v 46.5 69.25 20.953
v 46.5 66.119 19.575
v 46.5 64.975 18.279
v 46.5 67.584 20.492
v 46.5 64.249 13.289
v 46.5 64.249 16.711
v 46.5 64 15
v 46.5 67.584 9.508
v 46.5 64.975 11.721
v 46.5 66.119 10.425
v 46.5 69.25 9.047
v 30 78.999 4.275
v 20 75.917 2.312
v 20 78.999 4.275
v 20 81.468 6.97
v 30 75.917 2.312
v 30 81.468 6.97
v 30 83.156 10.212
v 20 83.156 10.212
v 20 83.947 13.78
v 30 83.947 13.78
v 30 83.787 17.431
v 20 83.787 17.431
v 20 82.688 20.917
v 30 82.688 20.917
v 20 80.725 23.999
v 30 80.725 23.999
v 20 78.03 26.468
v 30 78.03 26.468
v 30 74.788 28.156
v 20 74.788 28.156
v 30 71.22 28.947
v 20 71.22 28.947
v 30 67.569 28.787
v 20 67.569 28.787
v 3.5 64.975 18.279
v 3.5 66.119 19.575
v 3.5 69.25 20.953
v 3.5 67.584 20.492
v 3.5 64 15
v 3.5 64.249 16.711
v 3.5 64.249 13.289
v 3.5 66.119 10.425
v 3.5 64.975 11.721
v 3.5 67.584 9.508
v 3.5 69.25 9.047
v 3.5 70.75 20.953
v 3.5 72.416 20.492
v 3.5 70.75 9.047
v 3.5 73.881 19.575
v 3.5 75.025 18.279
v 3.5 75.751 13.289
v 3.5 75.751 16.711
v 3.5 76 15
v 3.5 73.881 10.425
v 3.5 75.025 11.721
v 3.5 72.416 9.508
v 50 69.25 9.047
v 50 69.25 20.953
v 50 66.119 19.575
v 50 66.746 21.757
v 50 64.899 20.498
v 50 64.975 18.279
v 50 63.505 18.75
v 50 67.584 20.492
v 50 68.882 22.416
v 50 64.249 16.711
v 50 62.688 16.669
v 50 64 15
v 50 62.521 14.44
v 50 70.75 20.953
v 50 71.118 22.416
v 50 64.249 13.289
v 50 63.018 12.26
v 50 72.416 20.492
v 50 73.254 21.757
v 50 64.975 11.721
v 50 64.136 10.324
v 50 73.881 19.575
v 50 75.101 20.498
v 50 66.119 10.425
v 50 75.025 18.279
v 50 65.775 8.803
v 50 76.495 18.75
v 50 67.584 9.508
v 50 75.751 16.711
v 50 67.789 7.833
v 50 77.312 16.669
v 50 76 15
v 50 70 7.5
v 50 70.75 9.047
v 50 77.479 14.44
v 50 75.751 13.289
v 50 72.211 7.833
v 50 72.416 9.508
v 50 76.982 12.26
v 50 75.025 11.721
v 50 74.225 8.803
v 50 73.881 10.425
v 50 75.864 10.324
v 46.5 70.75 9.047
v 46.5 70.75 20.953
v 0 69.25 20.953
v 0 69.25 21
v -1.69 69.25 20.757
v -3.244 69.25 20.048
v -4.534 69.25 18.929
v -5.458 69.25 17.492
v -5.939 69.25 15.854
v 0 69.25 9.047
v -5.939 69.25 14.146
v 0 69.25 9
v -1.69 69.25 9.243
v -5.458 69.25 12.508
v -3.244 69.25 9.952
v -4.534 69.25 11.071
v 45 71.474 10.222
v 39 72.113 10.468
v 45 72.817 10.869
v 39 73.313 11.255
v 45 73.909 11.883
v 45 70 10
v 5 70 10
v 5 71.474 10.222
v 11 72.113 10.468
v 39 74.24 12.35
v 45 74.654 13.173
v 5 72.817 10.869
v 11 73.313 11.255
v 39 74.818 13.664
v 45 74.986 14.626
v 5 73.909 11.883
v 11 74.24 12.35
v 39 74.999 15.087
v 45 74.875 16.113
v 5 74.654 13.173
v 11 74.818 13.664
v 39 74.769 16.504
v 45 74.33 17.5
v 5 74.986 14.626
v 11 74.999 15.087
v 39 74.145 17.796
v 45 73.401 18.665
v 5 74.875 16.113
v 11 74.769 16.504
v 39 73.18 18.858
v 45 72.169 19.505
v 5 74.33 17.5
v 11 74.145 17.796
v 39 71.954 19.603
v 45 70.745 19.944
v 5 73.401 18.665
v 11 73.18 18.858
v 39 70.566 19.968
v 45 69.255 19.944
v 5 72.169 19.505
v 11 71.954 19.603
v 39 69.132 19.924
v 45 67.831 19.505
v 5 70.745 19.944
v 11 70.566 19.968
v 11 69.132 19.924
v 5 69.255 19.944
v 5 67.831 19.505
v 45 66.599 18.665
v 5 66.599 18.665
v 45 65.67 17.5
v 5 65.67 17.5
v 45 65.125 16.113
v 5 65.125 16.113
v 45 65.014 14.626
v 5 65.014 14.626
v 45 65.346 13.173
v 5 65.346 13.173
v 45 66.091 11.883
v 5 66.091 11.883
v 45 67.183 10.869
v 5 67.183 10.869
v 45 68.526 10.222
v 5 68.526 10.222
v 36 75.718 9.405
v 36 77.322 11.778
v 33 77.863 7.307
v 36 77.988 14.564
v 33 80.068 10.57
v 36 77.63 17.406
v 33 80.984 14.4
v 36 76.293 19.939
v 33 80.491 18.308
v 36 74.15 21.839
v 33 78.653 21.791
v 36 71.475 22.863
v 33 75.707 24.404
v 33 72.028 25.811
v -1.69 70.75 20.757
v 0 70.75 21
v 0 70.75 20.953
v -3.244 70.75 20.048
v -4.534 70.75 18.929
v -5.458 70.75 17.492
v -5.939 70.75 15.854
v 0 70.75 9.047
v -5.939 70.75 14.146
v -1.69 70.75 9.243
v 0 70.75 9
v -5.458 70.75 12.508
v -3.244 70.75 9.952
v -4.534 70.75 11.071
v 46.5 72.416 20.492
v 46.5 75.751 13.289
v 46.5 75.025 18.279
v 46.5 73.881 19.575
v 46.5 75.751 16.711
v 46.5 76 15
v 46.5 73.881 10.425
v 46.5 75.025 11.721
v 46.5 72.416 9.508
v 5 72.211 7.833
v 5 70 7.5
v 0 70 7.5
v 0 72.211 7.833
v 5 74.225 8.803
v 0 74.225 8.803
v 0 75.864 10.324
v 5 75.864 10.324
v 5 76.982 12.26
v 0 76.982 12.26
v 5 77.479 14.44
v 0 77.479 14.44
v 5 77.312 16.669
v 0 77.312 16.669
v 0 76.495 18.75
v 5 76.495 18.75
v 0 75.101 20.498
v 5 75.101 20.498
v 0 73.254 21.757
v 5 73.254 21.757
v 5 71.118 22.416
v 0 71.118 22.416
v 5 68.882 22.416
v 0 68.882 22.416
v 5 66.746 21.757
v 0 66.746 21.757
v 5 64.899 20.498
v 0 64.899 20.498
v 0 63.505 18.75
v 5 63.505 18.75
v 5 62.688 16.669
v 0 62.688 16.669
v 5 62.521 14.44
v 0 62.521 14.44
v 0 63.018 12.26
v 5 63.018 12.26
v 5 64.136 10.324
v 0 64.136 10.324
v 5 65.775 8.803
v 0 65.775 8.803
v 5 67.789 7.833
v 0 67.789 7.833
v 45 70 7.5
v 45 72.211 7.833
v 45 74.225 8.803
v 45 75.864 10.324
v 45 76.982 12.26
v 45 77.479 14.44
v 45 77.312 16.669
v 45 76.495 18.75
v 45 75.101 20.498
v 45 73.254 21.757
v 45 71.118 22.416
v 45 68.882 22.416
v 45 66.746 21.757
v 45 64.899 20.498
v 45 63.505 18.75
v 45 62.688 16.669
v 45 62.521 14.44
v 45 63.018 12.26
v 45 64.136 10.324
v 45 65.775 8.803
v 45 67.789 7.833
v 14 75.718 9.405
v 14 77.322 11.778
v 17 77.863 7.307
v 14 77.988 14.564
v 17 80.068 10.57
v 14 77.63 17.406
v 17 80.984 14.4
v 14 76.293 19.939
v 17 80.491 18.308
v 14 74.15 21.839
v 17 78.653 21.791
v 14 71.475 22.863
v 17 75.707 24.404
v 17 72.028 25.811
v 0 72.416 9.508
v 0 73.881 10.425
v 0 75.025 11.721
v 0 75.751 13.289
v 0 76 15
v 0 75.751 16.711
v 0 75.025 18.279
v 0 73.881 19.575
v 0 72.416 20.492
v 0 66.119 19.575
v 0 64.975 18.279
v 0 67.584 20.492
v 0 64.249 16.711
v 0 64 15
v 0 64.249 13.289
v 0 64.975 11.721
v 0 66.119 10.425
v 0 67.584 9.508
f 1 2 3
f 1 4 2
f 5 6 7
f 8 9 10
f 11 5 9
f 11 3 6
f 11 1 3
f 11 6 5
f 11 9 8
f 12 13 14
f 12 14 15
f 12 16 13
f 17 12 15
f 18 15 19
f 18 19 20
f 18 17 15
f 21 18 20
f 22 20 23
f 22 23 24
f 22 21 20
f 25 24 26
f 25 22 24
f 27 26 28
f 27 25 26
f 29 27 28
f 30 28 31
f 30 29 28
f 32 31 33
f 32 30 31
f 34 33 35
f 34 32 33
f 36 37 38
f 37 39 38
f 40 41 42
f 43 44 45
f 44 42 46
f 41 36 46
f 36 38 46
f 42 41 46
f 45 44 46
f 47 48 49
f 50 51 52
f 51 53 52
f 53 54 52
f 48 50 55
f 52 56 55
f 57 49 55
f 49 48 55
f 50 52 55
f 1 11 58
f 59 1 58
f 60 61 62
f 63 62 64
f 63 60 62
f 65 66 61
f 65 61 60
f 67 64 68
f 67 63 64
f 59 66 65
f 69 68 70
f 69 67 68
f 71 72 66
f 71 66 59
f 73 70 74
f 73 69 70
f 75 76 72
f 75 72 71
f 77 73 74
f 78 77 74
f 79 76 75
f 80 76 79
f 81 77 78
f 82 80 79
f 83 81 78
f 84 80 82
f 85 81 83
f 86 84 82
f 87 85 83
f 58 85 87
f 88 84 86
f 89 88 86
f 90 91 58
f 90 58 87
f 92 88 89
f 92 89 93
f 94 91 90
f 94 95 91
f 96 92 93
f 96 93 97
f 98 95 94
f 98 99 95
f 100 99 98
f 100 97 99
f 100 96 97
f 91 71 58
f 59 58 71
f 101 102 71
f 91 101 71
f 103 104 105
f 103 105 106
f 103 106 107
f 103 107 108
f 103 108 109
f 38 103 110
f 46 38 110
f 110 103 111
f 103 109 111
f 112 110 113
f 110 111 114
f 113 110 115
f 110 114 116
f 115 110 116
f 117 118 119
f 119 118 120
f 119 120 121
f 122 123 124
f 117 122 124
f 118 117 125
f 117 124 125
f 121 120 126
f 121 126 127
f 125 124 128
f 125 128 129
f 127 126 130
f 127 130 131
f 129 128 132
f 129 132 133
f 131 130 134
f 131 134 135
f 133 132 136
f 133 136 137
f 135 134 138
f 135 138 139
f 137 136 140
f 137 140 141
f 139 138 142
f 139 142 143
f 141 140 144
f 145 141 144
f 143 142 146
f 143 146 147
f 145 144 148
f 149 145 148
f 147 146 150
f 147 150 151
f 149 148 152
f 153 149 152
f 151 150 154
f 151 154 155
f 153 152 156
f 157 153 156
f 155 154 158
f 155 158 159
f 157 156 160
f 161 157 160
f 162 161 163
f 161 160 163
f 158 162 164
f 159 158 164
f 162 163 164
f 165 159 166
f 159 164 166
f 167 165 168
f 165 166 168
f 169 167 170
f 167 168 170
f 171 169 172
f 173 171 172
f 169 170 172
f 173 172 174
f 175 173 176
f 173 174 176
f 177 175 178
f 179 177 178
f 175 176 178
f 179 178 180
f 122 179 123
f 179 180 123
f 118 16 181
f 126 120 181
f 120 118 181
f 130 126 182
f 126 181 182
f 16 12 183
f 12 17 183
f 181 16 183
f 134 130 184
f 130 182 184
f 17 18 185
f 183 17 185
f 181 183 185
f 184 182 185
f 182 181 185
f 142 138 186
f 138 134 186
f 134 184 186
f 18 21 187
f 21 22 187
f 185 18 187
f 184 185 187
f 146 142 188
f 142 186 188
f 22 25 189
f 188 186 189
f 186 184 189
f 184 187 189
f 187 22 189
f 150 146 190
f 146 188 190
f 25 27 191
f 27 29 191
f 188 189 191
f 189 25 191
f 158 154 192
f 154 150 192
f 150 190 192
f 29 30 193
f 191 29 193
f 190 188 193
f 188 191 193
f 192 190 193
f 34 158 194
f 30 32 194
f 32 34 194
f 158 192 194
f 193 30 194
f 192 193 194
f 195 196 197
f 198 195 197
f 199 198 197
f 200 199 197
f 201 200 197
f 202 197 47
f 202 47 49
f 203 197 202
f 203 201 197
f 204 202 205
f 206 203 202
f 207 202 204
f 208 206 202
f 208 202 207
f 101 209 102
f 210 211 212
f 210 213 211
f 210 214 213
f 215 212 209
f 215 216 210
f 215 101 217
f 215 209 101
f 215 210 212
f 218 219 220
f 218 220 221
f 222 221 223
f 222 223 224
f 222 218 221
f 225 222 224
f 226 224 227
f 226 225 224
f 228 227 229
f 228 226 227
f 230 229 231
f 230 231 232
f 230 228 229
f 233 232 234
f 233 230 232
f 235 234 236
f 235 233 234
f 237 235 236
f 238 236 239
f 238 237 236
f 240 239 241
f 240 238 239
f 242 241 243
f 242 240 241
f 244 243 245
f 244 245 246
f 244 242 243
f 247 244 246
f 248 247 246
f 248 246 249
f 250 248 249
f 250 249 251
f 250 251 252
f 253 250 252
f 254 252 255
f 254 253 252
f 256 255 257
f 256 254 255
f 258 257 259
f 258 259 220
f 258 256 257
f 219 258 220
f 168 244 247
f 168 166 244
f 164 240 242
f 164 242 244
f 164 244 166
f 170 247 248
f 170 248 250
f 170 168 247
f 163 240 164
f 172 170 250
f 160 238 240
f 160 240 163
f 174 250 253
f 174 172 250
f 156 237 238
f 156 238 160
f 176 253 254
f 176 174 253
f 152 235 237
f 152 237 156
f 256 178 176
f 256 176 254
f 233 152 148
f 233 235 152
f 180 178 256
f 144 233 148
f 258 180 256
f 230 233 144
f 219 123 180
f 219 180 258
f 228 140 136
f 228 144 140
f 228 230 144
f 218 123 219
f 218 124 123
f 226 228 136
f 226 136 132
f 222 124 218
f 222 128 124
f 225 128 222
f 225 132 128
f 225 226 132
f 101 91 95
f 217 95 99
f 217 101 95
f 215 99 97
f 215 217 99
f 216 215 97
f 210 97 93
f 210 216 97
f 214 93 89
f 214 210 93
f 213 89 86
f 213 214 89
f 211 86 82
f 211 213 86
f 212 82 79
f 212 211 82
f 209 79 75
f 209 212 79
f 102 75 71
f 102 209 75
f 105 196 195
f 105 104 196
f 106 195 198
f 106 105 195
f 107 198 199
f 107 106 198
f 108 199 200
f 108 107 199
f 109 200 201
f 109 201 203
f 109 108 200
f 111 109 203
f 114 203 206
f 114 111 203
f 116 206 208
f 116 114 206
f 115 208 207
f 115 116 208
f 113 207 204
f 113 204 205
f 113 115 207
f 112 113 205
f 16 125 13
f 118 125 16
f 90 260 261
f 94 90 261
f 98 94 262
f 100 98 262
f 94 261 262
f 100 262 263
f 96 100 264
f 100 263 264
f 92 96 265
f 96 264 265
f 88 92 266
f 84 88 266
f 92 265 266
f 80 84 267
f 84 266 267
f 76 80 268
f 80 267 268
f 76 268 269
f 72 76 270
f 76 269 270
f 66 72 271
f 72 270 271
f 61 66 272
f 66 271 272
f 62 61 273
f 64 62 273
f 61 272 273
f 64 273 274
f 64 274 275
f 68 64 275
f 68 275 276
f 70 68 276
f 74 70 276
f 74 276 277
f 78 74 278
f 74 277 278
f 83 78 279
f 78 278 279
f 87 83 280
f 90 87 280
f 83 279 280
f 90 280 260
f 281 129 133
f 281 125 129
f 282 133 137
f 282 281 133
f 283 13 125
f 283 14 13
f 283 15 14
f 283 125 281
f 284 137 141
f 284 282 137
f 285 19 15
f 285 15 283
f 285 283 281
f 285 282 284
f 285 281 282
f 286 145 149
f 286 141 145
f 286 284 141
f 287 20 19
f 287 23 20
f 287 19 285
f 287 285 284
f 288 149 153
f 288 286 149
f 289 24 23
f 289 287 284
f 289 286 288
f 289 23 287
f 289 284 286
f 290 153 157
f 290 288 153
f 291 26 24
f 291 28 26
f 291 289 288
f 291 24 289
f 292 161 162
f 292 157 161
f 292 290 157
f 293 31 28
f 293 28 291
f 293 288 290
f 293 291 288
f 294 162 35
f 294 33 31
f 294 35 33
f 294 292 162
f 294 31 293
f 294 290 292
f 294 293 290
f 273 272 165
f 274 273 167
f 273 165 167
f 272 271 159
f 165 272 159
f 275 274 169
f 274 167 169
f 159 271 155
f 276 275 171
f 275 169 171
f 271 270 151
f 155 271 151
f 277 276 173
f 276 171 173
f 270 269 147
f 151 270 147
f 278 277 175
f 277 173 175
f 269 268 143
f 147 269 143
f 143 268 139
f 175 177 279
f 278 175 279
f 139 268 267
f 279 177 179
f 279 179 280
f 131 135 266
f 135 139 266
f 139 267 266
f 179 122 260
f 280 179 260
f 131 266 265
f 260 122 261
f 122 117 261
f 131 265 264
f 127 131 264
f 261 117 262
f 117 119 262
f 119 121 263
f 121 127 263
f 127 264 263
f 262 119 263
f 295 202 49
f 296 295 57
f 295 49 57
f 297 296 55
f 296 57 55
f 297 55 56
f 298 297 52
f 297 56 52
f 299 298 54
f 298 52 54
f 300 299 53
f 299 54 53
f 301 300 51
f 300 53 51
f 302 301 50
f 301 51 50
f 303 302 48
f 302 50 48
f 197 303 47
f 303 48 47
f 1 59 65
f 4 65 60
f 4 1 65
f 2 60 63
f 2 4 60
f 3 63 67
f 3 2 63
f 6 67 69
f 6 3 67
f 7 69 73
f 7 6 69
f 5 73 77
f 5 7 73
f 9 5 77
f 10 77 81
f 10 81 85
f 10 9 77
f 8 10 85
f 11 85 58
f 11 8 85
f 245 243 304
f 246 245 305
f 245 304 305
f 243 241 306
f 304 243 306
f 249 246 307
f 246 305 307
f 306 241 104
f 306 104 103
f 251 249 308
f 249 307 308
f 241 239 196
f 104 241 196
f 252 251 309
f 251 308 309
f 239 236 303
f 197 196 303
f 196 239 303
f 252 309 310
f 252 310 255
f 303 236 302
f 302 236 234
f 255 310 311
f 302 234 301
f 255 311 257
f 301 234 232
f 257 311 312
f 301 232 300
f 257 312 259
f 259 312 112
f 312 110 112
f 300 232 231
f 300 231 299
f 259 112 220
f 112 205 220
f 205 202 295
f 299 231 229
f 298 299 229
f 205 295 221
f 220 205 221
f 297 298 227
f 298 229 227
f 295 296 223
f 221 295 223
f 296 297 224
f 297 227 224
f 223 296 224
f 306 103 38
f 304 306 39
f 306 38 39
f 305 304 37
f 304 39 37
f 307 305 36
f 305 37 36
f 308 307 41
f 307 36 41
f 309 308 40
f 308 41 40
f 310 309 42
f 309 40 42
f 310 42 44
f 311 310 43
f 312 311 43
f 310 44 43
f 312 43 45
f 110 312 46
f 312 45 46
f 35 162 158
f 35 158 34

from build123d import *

# Parameters (mm, degrees)
CYLINDER1033_W               = 6
CYLINDER1033_H               = 1.5
CYLINDER1033_ANGLE           = 180
CYLINDER1029_R               = 7.5
CYLINDER1029_DEPTH           = 5
CYLINDER1029_PITCH_ANGLE     = 90
THICKNESS001_T               = -1.5
BOX025_W                     = 4
BOX025_H                     = 1.5
BOX025_DEPTH                 = 12
CYLINDER1027_R               = 5
CYLINDER1027_DEPTH           = 40
CYLINDER1027_PITCH_ANGLE     = 90
CYLINDER1026_W               = 14
CYLINDER1026_H               = 10
CYLINDER1026_ANGLE           = 165
CYLINDER1026_ROLL_ANGLE      = 90
CYLINDER1026_PITCH_ANGLE     = 65
CYLINDER1026_PLACEMENT_ANGLE = 90
CONE001_ANGLE                = 165
CONE001_ROLL_ANGLE           = 90
CONE001_PITCH_ANGLE          = 65
CONE001_PLACEMENT_ANGLE      = 90


with BuildPart() as cylinder1047:
    # Cylinder1033 → Cylinder1033 (revolve)
    with BuildSketch(Plane(origin=(0, 70.75, 15), x_dir=(0, 0, 1), z_dir=(1, 0, 0))):
        with Locations((3, 0.75)):
            Rectangle(CYLINDER1033_W, CYLINDER1033_H)
    revolve(axis=Axis((0, 70.75, 15), (0, -1, 0)), revolution_arc=CYLINDER1033_ANGLE)


with BuildPart() as thickness001:
    # Cylinder1029 → Cylinder1029 (new body)
    with BuildSketch(Plane.XY):
        Circle(CYLINDER1029_R)
    extrude(amount=CYLINDER1029_DEPTH)


with BuildPart() as thickness001_1:
    # Cylinder1029 pitch: moved
    add(thickness001.part.rotate(Axis((0, 0, 0), (0, 1, 0)), CYLINDER1029_PITCH_ANGLE))


with BuildPart() as thickness001_2:
    # Cylinder1029 placement: moved
    add(thickness001_1.part.moved(Location((45, 70, 15))))

    # Thickness001
    thickness001_openings = [thickness001_2.faces().sort_by_distance(p)[0] for p in [
        (50, 70, 15),
    ]]
    offset(amount=THICKNESS001_T, openings=thickness001_openings)


with BuildPart() as fusion028:
    # Box025 → Box025 (new body)
    with BuildSketch(Plane(origin=(46, 69.25, 9), x_dir=(1, 0, 0), z_dir=(0, 0, 1))):
        with Locations((2, 0.75)):
            Rectangle(BOX025_W, BOX025_H)
    extrude(amount=BOX025_DEPTH)

    # Fusion028: union Thickness001
    add(thickness001_2.part)


with BuildPart() as cylinder1042:
    # Cylinder1027 → Cylinder1027 (new body)
    with BuildSketch(Plane.XY):
        Circle(CYLINDER1027_R)
    extrude(amount=CYLINDER1027_DEPTH)


with BuildPart() as cylinder1042_1:
    # Cylinder1027 pitch: moved
    add(cylinder1042.part.rotate(Axis((0, 0, 0), (0, 1, 0)), CYLINDER1027_PITCH_ANGLE))


with BuildPart() as cylinder1042_2:
    # Cylinder1027 placement: moved
    add(cylinder1042_1.part.moved(Location((5, 70, 15))))


with BuildPart() as cylinder1041:
    # Cylinder1026 → Cylinder1026 (revolve)
    with BuildSketch(Plane.XZ):
        with Locations((7, 5)):
            Rectangle(CYLINDER1026_W, CYLINDER1026_H)
    revolve(axis=Axis((0, 0, 0), (0, 0, 1)), revolution_arc=CYLINDER1026_ANGLE)


with BuildPart() as cylinder1041_1:
    # Cylinder1026 roll: moved
    add(cylinder1041.part.rotate(Axis((0, 0, 0), (1, 0, 0)), CYLINDER1026_ROLL_ANGLE))


with BuildPart() as cylinder1041_2:
    # Cylinder1026 pitch: moved
    add(cylinder1041_1.part.rotate(Axis((0, 0, 0), (0, 1, 0)), CYLINDER1026_PITCH_ANGLE))


with BuildPart() as cylinder1041_3:
    # Cylinder1026 placement: moved
    add(cylinder1041_2.part.moved(Location((20, 70, 15))).rotate(Axis((20, 70, 15), (0, 0, 1)), CYLINDER1026_PLACEMENT_ANGLE))


with BuildPart() as cone001:
    # Cone001 → Cone001 (revolve)
    with BuildSketch(Plane.XZ):
        Polygon((0, 0), (14, 14), (0, 14), align=None)
    revolve(axis=Axis((0, 0, 0), (0, 0, 1)), revolution_arc=CONE001_ANGLE)


with BuildPart() as cone001_1:
    # Cone001 roll: moved
    add(cone001.part.rotate(Axis((0, 0, 0), (1, 0, 0)), CONE001_ROLL_ANGLE))


with BuildPart() as cone001_2:
    # Cone001 pitch: moved
    add(cone001_1.part.rotate(Axis((0, 0, 0), (0, 1, 0)), CONE001_PITCH_ANGLE))


with BuildPart() as cone001_3:
    # Cone001 placement: moved
    add(cone001_2.part.moved(Location((6, 70, 15))).rotate(Axis((6, 70, 15), (0, 0, 1)), CONE001_PLACEMENT_ANGLE))


with BuildPart() as part_mirroring004:
    # Part__Mirroring004: instance of Cone001
    add(cone001_3.part.mirror(Plane(origin=(25, 0, 0), x_dir=(0, -1, 0), z_dir=(1, 0, 0))))


with BuildPart() as fusion050:
    # Part__Mirroring001: instance of Fusion028
    add(fusion028.part.mirror(Plane(origin=(25, 0, 0), x_dir=(0, -1, 0), z_dir=(1, 0, 0))))

    # Fusion031: union Fusion028, Cylinder1042, Cylinder1041, Part__Mirroring004, Cone001
    add(fusion028.part)
    add(cylinder1042_2.part)
    add(cylinder1041_3.part)
    add(part_mirroring004.part)
    add(cone001_3.part)

    # Fusion050: union Cylinder1047
    add(cylinder1047.part)


solid = fusion050.part
